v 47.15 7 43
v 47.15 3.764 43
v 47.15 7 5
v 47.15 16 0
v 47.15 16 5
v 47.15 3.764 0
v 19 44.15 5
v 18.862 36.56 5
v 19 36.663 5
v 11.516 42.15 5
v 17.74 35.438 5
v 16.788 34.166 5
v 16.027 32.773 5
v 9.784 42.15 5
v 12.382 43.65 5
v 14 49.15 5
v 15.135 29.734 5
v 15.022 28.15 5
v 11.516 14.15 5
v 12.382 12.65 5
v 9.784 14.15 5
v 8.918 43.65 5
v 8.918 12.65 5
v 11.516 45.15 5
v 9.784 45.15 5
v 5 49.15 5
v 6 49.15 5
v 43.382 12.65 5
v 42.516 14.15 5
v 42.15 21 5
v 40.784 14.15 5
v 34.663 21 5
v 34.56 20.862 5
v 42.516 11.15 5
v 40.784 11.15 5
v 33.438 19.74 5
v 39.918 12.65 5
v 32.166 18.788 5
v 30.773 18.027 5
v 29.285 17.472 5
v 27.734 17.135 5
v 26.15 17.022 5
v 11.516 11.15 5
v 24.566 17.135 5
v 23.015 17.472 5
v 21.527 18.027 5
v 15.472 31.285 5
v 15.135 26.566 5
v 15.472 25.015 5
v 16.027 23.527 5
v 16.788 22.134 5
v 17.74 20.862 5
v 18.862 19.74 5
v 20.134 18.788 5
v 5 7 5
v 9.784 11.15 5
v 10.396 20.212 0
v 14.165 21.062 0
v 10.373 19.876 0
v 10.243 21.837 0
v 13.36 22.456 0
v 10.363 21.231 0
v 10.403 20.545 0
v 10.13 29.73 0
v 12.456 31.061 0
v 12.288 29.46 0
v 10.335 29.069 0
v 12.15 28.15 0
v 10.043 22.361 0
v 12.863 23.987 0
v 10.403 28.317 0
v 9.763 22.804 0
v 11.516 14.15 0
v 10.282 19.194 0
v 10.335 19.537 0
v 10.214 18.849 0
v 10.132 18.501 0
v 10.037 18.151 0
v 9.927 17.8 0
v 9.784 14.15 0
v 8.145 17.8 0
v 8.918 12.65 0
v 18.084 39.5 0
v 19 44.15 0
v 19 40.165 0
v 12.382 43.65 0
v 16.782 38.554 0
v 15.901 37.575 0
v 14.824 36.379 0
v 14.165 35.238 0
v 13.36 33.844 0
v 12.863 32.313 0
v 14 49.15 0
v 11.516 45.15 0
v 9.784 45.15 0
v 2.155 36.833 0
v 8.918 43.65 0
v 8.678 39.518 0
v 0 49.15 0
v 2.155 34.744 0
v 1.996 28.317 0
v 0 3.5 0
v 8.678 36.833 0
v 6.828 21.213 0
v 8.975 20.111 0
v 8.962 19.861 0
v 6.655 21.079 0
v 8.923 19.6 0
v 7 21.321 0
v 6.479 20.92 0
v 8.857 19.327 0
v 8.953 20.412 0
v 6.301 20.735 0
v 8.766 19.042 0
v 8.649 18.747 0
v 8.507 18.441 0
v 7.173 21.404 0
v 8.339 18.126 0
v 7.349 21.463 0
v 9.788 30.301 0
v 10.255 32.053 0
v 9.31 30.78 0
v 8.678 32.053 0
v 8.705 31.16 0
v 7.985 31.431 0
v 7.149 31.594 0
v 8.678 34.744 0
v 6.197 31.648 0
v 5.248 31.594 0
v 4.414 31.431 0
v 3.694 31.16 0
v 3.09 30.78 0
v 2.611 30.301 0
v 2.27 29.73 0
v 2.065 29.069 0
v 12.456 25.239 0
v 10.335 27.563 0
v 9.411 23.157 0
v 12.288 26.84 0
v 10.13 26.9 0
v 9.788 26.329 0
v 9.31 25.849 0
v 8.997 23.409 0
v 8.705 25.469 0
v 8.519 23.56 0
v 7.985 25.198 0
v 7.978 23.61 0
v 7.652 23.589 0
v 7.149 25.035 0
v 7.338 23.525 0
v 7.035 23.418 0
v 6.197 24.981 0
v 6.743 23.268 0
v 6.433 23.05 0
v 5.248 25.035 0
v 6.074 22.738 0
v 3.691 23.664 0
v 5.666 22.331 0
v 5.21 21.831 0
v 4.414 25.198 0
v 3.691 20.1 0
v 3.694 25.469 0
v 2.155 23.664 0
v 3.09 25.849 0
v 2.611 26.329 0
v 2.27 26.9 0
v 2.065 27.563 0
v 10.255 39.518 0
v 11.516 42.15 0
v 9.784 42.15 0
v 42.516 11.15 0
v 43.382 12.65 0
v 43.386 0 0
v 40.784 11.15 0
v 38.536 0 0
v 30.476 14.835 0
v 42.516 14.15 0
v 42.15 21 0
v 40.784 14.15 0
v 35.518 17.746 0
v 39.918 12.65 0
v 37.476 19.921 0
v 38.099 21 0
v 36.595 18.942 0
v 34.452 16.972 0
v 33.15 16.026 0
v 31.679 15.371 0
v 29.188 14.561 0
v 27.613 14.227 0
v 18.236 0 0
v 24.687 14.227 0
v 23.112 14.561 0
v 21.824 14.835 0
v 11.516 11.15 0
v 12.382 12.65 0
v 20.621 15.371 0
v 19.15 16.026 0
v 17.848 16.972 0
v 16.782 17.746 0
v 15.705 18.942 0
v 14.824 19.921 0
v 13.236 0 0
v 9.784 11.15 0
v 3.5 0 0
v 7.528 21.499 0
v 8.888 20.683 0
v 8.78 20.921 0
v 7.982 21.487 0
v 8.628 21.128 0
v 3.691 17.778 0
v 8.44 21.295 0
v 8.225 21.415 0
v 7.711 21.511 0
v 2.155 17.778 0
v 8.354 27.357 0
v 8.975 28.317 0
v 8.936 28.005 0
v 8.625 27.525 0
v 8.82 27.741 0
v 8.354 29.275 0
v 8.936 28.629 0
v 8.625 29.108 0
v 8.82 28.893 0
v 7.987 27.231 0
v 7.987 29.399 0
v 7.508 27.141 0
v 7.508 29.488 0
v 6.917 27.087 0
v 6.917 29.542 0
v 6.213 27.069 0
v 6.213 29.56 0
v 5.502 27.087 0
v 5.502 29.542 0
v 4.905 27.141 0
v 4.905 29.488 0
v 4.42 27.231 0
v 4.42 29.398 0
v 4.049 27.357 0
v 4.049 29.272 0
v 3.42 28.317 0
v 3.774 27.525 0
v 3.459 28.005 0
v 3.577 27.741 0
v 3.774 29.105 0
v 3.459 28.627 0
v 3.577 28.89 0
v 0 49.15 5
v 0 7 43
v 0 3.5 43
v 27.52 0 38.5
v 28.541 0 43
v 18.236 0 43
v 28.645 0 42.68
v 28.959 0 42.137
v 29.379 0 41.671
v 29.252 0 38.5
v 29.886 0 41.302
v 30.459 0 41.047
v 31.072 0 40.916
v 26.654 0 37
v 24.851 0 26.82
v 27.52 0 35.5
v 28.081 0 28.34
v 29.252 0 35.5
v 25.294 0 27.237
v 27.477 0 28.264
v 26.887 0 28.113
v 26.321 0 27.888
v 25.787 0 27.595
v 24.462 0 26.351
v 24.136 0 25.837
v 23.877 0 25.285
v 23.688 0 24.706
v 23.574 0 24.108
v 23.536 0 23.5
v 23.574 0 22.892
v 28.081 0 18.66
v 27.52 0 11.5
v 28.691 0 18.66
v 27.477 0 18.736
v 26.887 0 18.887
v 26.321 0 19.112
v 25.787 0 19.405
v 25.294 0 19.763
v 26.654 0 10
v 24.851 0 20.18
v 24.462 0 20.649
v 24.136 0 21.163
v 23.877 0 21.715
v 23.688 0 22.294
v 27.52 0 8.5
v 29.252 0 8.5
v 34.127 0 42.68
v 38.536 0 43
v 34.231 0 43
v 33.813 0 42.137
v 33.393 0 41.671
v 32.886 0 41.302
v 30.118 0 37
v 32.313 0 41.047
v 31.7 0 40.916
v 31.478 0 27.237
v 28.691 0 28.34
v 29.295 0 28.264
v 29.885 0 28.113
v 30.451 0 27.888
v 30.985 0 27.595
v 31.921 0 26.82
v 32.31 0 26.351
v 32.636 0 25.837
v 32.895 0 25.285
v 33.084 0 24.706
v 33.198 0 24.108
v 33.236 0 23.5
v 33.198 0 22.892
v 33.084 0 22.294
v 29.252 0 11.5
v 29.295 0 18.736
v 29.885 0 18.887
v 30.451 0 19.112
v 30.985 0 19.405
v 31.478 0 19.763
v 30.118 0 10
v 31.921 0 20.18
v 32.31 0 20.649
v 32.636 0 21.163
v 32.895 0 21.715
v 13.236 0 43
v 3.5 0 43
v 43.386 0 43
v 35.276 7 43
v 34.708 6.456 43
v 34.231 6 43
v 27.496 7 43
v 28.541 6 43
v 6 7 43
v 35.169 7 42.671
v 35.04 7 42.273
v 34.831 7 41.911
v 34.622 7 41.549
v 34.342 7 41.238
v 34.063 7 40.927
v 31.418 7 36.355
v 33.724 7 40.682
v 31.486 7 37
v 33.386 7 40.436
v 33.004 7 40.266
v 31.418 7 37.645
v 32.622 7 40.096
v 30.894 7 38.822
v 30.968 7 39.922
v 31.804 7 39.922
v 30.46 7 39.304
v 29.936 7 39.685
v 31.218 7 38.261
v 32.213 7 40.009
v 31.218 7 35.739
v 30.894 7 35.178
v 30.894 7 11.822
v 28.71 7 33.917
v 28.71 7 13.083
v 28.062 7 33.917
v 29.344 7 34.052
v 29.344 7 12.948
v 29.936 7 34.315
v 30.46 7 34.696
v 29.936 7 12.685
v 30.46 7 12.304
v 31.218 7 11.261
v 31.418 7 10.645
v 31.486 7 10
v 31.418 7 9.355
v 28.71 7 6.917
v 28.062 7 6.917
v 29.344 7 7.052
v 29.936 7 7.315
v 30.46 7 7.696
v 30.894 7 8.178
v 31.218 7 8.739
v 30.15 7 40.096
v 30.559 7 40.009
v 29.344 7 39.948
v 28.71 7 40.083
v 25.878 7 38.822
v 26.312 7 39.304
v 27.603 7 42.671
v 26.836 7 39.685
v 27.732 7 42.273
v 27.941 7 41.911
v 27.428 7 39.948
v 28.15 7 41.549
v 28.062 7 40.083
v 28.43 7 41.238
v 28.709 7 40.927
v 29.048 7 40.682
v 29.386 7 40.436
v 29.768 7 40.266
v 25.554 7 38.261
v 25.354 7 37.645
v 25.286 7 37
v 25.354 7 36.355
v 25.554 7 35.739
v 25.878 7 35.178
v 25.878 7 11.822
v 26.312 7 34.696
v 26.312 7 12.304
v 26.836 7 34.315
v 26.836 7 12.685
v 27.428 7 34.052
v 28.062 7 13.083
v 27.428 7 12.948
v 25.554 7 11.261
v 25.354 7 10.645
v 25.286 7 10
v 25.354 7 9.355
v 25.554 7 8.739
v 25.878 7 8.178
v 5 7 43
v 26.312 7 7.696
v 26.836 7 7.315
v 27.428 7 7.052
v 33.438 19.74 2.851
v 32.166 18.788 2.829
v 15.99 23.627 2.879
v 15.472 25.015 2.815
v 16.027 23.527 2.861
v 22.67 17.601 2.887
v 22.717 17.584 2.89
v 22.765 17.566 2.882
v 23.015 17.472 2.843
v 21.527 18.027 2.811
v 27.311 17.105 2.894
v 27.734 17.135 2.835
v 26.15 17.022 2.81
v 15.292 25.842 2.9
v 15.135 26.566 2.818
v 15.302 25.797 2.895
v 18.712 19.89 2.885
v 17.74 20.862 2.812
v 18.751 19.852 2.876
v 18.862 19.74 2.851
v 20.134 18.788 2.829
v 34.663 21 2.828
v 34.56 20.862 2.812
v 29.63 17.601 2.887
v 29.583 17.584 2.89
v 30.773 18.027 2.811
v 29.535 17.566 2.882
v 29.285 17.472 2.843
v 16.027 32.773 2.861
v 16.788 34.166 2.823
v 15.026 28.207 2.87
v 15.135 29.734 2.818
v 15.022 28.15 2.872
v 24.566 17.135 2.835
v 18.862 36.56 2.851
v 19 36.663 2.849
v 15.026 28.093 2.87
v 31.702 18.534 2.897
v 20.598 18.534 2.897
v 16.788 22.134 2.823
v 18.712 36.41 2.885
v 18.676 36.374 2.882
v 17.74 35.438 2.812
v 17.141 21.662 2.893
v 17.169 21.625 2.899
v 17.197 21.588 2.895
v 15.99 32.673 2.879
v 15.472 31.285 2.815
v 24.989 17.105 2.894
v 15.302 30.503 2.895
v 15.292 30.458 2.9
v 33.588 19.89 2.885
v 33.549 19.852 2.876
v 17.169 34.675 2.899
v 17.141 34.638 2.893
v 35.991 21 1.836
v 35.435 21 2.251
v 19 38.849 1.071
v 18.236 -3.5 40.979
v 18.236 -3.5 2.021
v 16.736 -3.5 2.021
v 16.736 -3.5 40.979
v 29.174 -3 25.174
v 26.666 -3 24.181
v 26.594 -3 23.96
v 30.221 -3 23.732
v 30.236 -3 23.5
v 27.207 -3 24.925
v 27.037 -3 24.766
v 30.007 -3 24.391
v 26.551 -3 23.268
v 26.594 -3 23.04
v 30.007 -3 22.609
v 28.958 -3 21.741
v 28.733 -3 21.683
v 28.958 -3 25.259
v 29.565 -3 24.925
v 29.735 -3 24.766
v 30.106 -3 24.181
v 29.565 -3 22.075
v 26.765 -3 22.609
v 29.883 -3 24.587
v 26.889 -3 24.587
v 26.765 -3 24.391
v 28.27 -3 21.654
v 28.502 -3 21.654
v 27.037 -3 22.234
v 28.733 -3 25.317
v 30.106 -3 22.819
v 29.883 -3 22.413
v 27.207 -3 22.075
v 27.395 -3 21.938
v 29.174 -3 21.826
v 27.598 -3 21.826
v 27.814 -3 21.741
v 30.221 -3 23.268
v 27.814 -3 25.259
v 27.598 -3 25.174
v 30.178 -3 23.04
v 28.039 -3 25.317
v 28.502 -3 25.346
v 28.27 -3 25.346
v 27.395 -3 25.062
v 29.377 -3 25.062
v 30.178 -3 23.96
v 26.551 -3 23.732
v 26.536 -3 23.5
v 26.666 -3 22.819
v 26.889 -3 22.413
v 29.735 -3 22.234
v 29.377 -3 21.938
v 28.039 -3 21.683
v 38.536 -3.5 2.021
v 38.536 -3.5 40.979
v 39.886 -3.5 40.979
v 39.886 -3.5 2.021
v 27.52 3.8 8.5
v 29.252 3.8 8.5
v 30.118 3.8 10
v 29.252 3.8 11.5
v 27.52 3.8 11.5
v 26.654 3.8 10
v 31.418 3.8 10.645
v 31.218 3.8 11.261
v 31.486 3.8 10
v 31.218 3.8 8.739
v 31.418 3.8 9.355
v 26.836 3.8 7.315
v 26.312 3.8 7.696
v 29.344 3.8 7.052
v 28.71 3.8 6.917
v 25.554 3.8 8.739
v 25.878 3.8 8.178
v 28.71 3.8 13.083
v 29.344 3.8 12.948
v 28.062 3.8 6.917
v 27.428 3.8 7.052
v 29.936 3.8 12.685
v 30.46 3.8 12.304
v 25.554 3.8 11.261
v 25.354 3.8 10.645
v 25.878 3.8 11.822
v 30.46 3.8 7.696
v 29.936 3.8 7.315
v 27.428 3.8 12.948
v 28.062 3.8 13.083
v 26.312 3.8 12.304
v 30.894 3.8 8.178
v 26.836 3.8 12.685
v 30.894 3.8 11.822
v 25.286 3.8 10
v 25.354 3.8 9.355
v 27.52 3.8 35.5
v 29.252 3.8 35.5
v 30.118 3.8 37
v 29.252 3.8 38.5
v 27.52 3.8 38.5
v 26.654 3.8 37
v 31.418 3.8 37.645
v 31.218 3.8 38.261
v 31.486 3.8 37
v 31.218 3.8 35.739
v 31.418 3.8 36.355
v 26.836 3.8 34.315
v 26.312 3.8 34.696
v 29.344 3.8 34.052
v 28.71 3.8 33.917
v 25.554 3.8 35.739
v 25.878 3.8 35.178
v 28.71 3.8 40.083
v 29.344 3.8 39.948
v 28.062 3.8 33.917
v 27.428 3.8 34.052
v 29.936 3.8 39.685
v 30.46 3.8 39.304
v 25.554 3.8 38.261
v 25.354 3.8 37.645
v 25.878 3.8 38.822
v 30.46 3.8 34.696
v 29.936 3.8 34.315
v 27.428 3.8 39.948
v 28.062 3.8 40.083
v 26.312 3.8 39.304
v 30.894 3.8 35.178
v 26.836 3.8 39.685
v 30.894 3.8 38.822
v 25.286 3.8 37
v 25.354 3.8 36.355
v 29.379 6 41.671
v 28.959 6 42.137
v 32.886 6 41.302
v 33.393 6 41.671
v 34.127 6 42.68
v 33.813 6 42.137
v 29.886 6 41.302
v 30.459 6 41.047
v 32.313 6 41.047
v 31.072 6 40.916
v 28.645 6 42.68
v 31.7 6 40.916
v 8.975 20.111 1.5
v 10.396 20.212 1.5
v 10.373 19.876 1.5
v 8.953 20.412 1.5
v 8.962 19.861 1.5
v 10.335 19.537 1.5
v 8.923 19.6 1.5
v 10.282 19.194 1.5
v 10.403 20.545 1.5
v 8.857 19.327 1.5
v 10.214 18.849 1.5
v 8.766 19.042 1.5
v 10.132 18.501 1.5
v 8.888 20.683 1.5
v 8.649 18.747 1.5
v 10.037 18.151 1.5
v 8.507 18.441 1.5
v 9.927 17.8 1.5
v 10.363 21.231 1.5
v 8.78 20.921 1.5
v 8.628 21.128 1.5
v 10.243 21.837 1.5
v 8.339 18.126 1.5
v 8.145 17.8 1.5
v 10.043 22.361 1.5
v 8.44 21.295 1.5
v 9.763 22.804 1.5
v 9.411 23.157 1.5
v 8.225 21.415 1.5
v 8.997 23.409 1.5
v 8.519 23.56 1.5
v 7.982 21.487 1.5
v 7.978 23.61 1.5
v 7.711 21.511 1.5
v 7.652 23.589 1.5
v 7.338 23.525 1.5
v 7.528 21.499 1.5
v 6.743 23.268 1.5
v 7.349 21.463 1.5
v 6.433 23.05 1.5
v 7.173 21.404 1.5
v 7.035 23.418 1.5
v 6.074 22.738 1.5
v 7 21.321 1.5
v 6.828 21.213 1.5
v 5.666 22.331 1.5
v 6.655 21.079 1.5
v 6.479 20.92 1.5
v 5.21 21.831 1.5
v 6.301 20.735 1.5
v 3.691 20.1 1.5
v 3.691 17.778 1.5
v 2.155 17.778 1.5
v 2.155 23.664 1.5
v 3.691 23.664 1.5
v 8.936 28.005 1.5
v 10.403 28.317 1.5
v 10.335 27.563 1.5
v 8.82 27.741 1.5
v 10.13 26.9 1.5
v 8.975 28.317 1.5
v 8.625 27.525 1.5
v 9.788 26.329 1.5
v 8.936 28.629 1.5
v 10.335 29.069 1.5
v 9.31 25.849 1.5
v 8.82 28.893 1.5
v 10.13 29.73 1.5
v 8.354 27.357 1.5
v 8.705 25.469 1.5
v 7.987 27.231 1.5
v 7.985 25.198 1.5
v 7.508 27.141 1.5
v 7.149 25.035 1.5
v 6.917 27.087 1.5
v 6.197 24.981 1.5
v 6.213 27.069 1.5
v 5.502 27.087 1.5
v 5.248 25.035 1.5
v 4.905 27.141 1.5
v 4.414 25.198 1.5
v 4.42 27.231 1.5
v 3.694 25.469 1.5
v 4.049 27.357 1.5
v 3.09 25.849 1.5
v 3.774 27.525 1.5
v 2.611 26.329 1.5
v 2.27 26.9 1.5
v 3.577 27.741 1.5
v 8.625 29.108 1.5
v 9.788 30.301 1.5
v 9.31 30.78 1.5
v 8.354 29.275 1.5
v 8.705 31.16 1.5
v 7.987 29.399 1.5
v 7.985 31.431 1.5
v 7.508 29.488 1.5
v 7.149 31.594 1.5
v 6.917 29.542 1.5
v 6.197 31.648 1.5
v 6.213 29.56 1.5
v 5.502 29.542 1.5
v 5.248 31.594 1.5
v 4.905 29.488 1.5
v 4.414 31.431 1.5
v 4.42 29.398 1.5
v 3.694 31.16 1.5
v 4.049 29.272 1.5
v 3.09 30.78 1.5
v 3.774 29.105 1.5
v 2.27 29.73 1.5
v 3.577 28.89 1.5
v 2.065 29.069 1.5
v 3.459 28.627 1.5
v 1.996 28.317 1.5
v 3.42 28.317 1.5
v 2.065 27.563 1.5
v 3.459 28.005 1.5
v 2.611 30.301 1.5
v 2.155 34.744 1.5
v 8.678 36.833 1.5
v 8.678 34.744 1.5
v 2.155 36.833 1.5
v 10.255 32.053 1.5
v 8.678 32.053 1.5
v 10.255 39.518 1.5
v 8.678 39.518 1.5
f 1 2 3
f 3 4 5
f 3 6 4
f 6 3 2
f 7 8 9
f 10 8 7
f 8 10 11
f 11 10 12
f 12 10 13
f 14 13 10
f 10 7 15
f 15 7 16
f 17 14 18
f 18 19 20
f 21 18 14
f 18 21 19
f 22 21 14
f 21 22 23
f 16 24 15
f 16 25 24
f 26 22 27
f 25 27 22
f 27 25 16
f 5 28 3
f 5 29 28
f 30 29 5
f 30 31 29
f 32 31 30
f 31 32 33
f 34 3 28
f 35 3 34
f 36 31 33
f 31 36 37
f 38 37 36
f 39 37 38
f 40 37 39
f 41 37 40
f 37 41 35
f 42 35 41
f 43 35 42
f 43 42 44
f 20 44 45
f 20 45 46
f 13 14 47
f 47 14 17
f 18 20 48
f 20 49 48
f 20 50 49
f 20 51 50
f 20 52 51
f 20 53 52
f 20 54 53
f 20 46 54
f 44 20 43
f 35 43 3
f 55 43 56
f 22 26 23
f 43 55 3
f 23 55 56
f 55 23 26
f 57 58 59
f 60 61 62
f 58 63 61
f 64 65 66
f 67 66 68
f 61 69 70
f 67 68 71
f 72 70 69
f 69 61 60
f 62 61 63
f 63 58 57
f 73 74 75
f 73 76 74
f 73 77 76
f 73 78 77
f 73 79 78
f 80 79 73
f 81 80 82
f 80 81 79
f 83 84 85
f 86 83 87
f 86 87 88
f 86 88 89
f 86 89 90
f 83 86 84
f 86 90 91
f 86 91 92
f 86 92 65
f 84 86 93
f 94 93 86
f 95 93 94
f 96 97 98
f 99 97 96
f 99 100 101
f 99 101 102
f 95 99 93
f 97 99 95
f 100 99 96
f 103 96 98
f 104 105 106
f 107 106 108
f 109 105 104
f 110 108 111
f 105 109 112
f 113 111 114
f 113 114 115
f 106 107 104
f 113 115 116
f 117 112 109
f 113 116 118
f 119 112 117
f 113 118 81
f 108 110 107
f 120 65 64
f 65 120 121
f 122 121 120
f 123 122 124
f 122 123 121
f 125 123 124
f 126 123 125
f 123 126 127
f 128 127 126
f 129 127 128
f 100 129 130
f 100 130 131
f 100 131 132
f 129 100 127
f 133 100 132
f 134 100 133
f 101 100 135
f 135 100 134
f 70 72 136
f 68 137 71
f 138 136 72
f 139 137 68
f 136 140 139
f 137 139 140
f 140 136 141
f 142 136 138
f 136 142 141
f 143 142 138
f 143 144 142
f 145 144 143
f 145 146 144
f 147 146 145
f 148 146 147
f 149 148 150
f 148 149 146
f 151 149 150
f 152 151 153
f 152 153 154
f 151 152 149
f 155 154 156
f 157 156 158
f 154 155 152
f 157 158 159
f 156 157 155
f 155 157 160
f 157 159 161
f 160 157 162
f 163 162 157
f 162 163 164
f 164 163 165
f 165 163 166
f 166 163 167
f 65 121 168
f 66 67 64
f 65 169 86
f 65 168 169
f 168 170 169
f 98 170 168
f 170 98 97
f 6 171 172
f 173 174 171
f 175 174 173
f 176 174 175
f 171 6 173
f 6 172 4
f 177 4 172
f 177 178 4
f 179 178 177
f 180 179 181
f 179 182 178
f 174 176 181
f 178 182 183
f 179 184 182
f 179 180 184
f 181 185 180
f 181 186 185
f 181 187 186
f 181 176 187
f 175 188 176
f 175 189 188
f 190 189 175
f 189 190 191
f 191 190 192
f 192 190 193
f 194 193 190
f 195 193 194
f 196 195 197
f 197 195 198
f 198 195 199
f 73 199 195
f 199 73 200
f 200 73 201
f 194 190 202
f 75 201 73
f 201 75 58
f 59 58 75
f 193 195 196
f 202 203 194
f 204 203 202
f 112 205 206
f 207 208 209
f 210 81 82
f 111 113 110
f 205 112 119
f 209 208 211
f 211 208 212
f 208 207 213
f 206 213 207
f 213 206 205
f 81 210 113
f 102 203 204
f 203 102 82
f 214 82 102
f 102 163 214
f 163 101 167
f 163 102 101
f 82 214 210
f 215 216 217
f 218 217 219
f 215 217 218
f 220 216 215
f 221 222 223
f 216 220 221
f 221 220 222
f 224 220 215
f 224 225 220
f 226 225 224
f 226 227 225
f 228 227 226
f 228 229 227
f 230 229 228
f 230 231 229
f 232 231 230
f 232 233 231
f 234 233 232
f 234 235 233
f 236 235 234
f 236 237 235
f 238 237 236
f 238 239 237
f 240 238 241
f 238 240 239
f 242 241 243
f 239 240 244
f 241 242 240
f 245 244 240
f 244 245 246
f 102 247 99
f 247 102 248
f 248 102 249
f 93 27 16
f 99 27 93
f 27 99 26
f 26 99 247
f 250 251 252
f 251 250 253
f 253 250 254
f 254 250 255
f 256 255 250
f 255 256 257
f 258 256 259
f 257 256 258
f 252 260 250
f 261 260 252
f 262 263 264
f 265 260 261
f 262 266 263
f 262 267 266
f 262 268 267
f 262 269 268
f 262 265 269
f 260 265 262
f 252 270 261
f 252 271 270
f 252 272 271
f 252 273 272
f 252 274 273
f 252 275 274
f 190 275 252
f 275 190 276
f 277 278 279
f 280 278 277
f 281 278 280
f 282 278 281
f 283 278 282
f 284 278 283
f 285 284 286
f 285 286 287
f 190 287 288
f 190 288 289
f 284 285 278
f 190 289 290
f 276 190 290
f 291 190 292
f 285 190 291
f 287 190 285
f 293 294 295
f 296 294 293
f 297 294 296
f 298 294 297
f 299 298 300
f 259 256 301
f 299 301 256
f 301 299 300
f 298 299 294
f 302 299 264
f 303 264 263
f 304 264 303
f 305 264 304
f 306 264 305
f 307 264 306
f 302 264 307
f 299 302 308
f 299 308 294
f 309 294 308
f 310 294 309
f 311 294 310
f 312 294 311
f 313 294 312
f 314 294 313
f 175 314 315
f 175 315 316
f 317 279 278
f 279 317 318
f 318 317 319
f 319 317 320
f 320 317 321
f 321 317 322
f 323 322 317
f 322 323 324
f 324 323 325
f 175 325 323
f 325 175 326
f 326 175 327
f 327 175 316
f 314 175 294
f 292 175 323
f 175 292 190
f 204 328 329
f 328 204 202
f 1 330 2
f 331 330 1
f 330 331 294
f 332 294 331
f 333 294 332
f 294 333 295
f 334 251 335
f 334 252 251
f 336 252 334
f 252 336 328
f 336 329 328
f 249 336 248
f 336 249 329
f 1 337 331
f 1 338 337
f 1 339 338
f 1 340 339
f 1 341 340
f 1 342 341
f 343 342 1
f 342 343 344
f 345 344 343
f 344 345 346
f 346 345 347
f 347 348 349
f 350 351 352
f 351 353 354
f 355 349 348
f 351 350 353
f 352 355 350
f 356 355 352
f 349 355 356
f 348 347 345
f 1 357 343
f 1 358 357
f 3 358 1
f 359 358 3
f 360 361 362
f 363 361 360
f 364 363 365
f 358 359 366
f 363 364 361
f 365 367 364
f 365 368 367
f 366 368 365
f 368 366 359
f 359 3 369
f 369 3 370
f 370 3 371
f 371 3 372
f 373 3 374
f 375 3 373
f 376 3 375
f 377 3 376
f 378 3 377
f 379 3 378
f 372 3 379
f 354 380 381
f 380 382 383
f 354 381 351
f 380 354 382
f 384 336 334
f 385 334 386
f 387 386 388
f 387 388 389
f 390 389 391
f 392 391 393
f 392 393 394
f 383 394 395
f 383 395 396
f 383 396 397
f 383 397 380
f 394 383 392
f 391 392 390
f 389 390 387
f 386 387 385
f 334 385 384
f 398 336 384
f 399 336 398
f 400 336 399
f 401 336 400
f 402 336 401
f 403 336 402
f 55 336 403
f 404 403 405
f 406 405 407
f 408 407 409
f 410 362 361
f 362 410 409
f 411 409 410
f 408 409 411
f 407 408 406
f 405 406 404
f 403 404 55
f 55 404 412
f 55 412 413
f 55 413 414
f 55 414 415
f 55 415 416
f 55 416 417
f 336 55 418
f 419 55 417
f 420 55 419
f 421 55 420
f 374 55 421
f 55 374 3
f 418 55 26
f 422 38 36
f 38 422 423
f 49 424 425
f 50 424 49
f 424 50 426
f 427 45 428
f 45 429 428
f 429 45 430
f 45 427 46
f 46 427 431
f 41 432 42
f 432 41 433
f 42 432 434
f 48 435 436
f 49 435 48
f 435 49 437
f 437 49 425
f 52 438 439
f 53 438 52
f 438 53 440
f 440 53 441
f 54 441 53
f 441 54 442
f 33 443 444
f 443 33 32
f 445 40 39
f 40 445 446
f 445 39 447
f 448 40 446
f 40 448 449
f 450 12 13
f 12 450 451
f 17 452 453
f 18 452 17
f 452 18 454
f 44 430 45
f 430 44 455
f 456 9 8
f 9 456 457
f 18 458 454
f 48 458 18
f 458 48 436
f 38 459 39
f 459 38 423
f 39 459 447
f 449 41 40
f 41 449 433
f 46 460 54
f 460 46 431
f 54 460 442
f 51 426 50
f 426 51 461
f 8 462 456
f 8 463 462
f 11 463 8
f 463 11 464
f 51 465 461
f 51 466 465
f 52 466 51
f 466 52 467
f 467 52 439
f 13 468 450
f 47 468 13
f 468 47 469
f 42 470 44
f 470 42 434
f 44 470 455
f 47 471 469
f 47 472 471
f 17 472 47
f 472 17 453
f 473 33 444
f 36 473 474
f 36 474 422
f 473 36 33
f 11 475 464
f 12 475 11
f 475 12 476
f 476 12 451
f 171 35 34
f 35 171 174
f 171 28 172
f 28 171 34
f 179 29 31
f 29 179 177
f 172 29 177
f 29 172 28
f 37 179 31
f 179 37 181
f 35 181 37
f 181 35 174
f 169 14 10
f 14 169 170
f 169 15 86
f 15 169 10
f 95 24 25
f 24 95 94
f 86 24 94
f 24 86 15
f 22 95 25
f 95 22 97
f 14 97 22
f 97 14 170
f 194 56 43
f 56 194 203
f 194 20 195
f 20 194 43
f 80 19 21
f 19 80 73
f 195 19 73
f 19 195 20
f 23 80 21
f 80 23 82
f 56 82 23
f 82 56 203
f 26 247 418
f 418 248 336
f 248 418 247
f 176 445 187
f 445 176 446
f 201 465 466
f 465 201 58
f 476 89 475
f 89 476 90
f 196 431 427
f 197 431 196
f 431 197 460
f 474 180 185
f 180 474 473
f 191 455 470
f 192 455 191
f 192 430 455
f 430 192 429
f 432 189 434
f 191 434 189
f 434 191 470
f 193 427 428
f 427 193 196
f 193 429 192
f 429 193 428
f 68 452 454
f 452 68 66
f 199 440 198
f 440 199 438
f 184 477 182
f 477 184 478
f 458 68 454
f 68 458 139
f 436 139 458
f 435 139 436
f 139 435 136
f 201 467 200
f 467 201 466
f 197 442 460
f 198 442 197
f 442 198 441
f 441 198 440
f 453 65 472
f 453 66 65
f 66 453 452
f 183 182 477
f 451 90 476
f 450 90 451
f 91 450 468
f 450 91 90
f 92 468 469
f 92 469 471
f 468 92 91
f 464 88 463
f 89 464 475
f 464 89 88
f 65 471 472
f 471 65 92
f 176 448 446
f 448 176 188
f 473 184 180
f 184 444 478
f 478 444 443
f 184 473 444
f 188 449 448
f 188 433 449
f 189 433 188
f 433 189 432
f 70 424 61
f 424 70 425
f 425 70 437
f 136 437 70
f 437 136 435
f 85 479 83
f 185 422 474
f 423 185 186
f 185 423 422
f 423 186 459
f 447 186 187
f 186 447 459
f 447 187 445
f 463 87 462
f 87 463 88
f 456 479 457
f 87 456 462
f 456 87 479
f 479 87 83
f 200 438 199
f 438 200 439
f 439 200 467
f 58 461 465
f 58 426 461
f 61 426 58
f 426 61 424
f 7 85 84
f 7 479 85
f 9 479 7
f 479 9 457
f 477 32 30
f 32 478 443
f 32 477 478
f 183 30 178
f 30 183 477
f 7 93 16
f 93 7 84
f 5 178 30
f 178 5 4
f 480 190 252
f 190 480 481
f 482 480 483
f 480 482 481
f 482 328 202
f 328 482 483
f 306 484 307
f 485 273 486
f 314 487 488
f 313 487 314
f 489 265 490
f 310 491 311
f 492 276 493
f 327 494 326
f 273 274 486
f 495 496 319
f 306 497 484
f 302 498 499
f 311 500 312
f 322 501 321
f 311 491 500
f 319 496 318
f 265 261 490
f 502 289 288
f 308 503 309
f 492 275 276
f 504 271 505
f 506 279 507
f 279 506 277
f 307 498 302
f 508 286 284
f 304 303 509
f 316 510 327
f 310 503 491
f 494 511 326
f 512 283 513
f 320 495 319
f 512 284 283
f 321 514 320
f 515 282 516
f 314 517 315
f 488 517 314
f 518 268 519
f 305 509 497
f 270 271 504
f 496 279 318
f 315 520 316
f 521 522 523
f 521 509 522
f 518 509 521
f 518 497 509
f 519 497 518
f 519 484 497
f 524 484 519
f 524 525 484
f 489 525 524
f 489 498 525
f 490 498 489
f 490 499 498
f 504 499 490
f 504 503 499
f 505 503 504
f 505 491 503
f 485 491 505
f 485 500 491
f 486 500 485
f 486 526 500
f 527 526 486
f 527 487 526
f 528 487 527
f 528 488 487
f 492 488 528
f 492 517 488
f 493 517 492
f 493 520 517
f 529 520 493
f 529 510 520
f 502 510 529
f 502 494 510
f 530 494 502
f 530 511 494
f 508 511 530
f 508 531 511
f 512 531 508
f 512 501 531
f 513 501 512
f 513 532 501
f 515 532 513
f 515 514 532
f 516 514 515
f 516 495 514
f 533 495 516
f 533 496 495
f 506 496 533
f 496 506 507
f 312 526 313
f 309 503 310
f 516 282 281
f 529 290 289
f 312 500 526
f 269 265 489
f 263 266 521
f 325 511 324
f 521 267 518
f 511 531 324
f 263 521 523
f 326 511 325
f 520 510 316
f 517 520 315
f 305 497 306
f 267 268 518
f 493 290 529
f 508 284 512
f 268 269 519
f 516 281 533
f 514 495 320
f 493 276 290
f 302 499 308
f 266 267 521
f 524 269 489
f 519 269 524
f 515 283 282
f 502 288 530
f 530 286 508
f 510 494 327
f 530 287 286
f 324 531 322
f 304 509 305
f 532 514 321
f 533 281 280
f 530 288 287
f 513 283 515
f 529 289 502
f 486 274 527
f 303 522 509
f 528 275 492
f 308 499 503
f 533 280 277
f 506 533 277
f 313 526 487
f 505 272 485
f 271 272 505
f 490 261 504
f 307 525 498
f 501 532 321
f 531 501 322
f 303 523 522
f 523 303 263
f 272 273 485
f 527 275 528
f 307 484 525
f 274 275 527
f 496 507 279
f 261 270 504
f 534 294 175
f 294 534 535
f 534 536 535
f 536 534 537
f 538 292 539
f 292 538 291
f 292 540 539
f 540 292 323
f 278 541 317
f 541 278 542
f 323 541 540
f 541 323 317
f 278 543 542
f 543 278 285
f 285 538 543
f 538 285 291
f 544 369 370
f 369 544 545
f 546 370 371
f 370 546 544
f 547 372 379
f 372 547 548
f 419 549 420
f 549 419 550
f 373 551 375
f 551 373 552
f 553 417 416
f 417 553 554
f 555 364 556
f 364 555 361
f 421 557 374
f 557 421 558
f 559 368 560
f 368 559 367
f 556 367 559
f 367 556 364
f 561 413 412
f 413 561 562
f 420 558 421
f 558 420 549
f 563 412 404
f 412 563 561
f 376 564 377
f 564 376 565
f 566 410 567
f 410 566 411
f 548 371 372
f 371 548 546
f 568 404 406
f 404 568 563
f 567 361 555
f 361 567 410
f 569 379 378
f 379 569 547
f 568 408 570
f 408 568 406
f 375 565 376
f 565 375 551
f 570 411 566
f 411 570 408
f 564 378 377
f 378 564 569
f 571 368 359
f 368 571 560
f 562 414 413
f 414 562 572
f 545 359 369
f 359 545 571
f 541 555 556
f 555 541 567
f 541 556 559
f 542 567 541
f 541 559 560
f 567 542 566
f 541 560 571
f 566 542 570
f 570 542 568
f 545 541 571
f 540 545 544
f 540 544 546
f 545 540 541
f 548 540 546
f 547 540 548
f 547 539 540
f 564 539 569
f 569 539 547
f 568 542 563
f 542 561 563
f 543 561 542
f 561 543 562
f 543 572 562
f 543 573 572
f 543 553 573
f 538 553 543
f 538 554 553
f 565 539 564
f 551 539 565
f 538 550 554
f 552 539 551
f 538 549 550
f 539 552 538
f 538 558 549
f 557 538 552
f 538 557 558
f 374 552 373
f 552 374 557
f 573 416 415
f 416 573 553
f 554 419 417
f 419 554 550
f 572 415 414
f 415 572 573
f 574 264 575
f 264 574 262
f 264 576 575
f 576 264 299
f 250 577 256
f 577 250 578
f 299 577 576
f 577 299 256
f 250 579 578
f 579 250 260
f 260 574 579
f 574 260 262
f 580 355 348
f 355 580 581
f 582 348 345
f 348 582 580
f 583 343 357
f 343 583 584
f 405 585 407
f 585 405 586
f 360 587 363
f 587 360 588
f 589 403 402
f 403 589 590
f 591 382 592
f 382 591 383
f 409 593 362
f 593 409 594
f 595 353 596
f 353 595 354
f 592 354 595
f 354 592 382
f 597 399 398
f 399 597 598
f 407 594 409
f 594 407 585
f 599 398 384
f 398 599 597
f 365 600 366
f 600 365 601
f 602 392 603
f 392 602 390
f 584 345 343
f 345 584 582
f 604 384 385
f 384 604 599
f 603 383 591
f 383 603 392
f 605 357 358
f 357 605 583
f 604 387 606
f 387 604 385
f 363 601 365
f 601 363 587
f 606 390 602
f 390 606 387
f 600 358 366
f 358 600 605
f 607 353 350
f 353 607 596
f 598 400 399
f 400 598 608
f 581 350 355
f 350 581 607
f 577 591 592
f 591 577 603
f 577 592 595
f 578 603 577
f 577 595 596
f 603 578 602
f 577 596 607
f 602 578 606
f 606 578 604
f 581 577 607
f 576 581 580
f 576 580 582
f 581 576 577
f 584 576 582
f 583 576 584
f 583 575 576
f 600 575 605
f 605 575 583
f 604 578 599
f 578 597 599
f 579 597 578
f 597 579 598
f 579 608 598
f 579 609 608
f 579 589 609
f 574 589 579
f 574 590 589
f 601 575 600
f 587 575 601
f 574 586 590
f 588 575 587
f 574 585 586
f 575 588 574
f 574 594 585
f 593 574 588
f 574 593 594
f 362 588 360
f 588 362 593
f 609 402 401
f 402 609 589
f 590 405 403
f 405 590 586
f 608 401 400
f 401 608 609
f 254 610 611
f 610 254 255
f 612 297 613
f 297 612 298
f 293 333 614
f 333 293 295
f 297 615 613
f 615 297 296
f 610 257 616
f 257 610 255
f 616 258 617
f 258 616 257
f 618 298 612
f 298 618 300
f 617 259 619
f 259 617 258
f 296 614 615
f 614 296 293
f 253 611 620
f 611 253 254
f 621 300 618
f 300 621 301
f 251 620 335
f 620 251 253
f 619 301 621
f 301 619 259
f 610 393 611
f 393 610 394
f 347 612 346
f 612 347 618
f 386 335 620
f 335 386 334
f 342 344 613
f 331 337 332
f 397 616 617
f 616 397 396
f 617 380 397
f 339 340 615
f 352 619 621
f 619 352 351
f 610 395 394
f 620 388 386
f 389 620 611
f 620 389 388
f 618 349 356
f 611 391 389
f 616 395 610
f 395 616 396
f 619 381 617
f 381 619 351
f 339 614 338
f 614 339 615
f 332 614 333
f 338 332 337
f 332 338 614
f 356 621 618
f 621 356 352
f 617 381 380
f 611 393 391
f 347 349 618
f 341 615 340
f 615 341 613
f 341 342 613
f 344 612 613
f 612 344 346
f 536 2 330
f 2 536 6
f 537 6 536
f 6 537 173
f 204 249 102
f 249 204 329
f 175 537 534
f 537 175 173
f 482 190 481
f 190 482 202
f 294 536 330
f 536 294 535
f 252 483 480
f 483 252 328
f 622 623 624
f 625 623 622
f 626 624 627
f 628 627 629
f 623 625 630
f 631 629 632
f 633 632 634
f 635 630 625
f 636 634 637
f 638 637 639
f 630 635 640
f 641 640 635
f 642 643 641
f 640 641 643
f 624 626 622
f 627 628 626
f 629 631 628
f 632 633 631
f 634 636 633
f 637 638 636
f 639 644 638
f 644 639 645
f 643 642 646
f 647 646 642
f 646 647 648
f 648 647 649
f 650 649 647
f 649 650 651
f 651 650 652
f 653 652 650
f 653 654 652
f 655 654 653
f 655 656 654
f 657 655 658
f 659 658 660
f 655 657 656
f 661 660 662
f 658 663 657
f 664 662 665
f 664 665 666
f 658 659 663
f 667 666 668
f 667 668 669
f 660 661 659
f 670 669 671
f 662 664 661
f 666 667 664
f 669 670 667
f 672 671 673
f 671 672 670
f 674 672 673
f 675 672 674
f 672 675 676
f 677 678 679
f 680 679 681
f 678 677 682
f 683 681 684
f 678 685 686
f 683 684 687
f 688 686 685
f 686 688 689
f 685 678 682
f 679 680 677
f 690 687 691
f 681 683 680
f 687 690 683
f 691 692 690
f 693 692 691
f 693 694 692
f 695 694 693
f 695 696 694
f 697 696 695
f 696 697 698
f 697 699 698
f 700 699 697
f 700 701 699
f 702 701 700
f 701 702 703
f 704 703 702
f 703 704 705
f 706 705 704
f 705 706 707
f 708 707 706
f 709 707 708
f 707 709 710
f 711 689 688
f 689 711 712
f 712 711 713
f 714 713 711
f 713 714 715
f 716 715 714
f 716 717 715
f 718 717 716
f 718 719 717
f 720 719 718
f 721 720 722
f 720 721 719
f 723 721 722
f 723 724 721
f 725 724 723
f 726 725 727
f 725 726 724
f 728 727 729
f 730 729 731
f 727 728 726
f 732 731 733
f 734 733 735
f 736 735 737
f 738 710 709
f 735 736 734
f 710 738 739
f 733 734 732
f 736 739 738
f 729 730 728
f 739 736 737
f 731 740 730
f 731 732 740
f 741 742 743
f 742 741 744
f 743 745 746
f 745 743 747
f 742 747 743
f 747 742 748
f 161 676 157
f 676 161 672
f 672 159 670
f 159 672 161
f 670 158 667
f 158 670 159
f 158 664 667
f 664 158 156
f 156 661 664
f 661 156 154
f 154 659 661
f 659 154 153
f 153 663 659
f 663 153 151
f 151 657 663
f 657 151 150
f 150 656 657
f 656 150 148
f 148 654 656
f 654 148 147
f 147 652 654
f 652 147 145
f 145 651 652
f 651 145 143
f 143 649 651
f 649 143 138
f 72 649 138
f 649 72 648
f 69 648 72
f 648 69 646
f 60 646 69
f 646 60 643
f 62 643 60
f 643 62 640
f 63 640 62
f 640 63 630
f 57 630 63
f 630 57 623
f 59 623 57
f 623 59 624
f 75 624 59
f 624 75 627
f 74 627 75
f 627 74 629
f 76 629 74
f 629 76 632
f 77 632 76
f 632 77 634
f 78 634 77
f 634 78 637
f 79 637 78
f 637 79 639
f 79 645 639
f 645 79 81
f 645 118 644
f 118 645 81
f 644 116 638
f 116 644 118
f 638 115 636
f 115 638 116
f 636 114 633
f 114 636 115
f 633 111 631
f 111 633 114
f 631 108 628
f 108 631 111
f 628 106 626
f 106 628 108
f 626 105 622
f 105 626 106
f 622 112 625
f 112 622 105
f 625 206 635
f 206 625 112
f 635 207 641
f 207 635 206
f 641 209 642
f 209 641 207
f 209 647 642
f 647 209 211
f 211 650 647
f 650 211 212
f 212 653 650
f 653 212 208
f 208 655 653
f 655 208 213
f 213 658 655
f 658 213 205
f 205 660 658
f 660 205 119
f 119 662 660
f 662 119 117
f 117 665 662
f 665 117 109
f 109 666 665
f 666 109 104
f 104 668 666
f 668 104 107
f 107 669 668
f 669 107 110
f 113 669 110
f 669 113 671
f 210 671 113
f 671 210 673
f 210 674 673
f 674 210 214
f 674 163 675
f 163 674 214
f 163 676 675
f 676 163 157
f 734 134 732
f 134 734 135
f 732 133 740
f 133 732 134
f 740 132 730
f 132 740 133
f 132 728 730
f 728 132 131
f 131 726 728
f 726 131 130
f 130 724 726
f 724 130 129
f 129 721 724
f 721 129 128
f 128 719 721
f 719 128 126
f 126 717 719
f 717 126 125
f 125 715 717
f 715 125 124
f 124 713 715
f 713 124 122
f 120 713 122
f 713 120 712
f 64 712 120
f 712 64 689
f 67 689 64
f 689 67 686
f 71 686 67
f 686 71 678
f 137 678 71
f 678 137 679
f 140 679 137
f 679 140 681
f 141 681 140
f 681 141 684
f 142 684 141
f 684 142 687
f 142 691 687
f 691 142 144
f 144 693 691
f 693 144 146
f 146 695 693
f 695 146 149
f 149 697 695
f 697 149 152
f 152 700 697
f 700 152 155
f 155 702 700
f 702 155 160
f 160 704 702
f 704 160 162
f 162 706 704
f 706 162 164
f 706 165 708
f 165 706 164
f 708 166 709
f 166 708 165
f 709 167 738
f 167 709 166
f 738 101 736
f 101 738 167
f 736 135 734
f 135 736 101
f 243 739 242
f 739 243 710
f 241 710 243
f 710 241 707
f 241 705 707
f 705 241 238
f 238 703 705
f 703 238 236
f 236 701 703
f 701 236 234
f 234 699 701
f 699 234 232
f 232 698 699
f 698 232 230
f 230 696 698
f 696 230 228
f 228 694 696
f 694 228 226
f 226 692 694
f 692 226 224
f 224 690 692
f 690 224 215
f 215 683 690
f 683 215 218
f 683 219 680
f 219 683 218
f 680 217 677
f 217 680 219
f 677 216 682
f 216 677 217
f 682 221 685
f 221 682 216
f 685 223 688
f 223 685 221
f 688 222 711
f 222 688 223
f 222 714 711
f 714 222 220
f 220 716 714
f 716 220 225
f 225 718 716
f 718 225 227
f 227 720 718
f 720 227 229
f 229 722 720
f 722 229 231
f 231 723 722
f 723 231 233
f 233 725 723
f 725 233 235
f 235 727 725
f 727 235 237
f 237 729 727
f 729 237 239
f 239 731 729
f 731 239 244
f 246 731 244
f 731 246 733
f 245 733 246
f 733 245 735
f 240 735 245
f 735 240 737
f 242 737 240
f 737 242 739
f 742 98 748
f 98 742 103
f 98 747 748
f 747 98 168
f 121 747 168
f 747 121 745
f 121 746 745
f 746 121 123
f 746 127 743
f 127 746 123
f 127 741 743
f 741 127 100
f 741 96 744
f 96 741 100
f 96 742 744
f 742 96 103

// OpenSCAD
// file: polyhole_re.scad
// polyholes - correct diameter for printing holes
//
// See http://hydraraptor.blogspot.com/2011/02/polyholes.html
//
// inspired by Josef Prusa (Prusa i3)
//
// GNU GPL v3
// R.E. 2017.06



function polyhole_n(r) = max(round(4 * r),3);
function polyhole_radius(r) = r / cos (180 / polyhole_n(r));

module polyhole(h, r, center = false) {
    rotate([0,0,0])
        cylinder(h = h, r = polyhole_radius(r), center = center, $fn = polyhole_n(r));
}


//test
high=20;
radius=4;
cylinder(high,r=radius,center=false);
translate([-3*radius,0,0])
  polyhole(high,radius,center=false);
echo("<b>Radius=</b>",radius);
echo("<b>polyhole_rad_n=</b>",polyhole_n(radius));
echo("<b>polyhole_radius=</b>",polyhole_radius(radius));
// main file
// Anet A6 X-End MOTOR MOUNT
//
// GNU GPL v3
// R.E. 2017.06

use <polyhole_re.scad>

module motor_mount(){
  difference(){
    union(){
      cube ([42.15+5,42.15+7,5]);
      cube ([42.15+5,7,43]);
      cube ([5,42.15+7,43]);
    }

translate([-1,42.15+7,5])
  rotate([atan((42.15)/(43-5)),0,0])
    cube ([7,30,60]);
    
translate([26.15,28.15,-2]){  
  polyhole(10,11.1);
  translate([31/2,31/2,0])
      polyhole(10,1.5);
  translate([31/2,-31/2,0])
      polyhole(10,1.5);
  translate([-31/2,31/2,0])
      polyhole(10,1.5);
  translate([-31/2,-31/2,0])
      polyhole(10,1.5);
}

translate([26.15,28.15,-7])  
  cylinder(10,r1=21,r2=11,$fn=30);

translate([19,21,-2])
  cube([50,50,10]);
translate([19-2-5,42.15+7+2,-2])
  rotate([0,0,-45])
    cube([60,30,10]);
}
}


module motor_mount_adjustment(high=28.386,extra_space=0){
  //adjustment
  translate([high,0,0]) {
    //adjustment centering
    translate([0,0,23.5])  
      rotate([90,0,0])
        cylinder(3,r1=5-extra_space/2,r2=5-3-extra_space/2,$fn=50);
  
    //adjustment top
    translate([10+extra_space/2,0,0])
      difference(){
        translate([0,-3.5,0])
          cube([5,3.5,43]);
/*        translate([5,0,0])
          rotate([0,0,45]) 
            translate([-5,-3.5,-1])
              cube([15,3.5,45]); */
    }
    //adjustment bottom
    translate([-5-10-extra_space/2,0,0])
      difference(){
        translate([0,-3.5,0])
          cube([5,3.5,43]);
          rotate([0,0,-45]) 
            translate([0,-3.5,-1])
              cube([5,3.5,45]);
    }
  }
}

module motor_mount_screws(high=28.386){
  translate([high,5+7-3.2,10])  
    rotate([90,0,0]){
      polyhole(15,1.5);
      cylinder(5,r=3.1,$fn=30);
    }
  translate([high,5+7-3.2,10+27])  
    rotate([90,0,0]){
      polyhole(15,1.5);
      cylinder(5,r=3.1,$fn=30);
  }
  //for endStop cable
  translate([high+3,10,43+0.9])  
    rotate([90,0,0])
      cylinder(20,r=3,$fn=30);
  translate([high+3,6,43+0.9])  
    rotate([-90,0,0])
      cylinder(3,r1=3,r2=6,$fn=30);
      
  //top beavel
  translate([15+high,0,0])
    rotate([0,0,45]) 
      translate([-5,-3.5,-1])
        cube([15,3.5,45]);
}

module fancy (){
  //bottom beavel
  translate([-4,7.5,0])
    rotate([0,0,-45]) 
      translate([0,-3.5,-1])
        cube([15,3.5,45]);
  rotate([-30,0,0]) 
    translate([-5,-15,-3.5])
      cube([55,15,3.5]);
  translate([0,0,43])
    rotate([30,0,0]) 
      translate([-5,-15,0])
        cube([55,15,3.5]);
  
}


difference(){
  // for Pulley GT2 20T high=28.386
  // for Pulley GT2 16T Motor high=28.386 + 1.27
  high=28.386; text="20T";
  //high=28.386-1.27; text="16T"; 
  extra_space=.3;
  
  union(){
    motor_mount();
    motor_mount_adjustment(high,extra_space);
    //Anet A6 Text  
  }
  motor_mount_screws(high);
  fancy();
  
  //Text
  translate([2,28.15,0])
    rotate([0,0,-90])
      mirror([1,0,0])
        linear_extrude(height=1.5)
          text(text, size=8, font=":style=Bold", halign="center", valign="bottom");
  
}
